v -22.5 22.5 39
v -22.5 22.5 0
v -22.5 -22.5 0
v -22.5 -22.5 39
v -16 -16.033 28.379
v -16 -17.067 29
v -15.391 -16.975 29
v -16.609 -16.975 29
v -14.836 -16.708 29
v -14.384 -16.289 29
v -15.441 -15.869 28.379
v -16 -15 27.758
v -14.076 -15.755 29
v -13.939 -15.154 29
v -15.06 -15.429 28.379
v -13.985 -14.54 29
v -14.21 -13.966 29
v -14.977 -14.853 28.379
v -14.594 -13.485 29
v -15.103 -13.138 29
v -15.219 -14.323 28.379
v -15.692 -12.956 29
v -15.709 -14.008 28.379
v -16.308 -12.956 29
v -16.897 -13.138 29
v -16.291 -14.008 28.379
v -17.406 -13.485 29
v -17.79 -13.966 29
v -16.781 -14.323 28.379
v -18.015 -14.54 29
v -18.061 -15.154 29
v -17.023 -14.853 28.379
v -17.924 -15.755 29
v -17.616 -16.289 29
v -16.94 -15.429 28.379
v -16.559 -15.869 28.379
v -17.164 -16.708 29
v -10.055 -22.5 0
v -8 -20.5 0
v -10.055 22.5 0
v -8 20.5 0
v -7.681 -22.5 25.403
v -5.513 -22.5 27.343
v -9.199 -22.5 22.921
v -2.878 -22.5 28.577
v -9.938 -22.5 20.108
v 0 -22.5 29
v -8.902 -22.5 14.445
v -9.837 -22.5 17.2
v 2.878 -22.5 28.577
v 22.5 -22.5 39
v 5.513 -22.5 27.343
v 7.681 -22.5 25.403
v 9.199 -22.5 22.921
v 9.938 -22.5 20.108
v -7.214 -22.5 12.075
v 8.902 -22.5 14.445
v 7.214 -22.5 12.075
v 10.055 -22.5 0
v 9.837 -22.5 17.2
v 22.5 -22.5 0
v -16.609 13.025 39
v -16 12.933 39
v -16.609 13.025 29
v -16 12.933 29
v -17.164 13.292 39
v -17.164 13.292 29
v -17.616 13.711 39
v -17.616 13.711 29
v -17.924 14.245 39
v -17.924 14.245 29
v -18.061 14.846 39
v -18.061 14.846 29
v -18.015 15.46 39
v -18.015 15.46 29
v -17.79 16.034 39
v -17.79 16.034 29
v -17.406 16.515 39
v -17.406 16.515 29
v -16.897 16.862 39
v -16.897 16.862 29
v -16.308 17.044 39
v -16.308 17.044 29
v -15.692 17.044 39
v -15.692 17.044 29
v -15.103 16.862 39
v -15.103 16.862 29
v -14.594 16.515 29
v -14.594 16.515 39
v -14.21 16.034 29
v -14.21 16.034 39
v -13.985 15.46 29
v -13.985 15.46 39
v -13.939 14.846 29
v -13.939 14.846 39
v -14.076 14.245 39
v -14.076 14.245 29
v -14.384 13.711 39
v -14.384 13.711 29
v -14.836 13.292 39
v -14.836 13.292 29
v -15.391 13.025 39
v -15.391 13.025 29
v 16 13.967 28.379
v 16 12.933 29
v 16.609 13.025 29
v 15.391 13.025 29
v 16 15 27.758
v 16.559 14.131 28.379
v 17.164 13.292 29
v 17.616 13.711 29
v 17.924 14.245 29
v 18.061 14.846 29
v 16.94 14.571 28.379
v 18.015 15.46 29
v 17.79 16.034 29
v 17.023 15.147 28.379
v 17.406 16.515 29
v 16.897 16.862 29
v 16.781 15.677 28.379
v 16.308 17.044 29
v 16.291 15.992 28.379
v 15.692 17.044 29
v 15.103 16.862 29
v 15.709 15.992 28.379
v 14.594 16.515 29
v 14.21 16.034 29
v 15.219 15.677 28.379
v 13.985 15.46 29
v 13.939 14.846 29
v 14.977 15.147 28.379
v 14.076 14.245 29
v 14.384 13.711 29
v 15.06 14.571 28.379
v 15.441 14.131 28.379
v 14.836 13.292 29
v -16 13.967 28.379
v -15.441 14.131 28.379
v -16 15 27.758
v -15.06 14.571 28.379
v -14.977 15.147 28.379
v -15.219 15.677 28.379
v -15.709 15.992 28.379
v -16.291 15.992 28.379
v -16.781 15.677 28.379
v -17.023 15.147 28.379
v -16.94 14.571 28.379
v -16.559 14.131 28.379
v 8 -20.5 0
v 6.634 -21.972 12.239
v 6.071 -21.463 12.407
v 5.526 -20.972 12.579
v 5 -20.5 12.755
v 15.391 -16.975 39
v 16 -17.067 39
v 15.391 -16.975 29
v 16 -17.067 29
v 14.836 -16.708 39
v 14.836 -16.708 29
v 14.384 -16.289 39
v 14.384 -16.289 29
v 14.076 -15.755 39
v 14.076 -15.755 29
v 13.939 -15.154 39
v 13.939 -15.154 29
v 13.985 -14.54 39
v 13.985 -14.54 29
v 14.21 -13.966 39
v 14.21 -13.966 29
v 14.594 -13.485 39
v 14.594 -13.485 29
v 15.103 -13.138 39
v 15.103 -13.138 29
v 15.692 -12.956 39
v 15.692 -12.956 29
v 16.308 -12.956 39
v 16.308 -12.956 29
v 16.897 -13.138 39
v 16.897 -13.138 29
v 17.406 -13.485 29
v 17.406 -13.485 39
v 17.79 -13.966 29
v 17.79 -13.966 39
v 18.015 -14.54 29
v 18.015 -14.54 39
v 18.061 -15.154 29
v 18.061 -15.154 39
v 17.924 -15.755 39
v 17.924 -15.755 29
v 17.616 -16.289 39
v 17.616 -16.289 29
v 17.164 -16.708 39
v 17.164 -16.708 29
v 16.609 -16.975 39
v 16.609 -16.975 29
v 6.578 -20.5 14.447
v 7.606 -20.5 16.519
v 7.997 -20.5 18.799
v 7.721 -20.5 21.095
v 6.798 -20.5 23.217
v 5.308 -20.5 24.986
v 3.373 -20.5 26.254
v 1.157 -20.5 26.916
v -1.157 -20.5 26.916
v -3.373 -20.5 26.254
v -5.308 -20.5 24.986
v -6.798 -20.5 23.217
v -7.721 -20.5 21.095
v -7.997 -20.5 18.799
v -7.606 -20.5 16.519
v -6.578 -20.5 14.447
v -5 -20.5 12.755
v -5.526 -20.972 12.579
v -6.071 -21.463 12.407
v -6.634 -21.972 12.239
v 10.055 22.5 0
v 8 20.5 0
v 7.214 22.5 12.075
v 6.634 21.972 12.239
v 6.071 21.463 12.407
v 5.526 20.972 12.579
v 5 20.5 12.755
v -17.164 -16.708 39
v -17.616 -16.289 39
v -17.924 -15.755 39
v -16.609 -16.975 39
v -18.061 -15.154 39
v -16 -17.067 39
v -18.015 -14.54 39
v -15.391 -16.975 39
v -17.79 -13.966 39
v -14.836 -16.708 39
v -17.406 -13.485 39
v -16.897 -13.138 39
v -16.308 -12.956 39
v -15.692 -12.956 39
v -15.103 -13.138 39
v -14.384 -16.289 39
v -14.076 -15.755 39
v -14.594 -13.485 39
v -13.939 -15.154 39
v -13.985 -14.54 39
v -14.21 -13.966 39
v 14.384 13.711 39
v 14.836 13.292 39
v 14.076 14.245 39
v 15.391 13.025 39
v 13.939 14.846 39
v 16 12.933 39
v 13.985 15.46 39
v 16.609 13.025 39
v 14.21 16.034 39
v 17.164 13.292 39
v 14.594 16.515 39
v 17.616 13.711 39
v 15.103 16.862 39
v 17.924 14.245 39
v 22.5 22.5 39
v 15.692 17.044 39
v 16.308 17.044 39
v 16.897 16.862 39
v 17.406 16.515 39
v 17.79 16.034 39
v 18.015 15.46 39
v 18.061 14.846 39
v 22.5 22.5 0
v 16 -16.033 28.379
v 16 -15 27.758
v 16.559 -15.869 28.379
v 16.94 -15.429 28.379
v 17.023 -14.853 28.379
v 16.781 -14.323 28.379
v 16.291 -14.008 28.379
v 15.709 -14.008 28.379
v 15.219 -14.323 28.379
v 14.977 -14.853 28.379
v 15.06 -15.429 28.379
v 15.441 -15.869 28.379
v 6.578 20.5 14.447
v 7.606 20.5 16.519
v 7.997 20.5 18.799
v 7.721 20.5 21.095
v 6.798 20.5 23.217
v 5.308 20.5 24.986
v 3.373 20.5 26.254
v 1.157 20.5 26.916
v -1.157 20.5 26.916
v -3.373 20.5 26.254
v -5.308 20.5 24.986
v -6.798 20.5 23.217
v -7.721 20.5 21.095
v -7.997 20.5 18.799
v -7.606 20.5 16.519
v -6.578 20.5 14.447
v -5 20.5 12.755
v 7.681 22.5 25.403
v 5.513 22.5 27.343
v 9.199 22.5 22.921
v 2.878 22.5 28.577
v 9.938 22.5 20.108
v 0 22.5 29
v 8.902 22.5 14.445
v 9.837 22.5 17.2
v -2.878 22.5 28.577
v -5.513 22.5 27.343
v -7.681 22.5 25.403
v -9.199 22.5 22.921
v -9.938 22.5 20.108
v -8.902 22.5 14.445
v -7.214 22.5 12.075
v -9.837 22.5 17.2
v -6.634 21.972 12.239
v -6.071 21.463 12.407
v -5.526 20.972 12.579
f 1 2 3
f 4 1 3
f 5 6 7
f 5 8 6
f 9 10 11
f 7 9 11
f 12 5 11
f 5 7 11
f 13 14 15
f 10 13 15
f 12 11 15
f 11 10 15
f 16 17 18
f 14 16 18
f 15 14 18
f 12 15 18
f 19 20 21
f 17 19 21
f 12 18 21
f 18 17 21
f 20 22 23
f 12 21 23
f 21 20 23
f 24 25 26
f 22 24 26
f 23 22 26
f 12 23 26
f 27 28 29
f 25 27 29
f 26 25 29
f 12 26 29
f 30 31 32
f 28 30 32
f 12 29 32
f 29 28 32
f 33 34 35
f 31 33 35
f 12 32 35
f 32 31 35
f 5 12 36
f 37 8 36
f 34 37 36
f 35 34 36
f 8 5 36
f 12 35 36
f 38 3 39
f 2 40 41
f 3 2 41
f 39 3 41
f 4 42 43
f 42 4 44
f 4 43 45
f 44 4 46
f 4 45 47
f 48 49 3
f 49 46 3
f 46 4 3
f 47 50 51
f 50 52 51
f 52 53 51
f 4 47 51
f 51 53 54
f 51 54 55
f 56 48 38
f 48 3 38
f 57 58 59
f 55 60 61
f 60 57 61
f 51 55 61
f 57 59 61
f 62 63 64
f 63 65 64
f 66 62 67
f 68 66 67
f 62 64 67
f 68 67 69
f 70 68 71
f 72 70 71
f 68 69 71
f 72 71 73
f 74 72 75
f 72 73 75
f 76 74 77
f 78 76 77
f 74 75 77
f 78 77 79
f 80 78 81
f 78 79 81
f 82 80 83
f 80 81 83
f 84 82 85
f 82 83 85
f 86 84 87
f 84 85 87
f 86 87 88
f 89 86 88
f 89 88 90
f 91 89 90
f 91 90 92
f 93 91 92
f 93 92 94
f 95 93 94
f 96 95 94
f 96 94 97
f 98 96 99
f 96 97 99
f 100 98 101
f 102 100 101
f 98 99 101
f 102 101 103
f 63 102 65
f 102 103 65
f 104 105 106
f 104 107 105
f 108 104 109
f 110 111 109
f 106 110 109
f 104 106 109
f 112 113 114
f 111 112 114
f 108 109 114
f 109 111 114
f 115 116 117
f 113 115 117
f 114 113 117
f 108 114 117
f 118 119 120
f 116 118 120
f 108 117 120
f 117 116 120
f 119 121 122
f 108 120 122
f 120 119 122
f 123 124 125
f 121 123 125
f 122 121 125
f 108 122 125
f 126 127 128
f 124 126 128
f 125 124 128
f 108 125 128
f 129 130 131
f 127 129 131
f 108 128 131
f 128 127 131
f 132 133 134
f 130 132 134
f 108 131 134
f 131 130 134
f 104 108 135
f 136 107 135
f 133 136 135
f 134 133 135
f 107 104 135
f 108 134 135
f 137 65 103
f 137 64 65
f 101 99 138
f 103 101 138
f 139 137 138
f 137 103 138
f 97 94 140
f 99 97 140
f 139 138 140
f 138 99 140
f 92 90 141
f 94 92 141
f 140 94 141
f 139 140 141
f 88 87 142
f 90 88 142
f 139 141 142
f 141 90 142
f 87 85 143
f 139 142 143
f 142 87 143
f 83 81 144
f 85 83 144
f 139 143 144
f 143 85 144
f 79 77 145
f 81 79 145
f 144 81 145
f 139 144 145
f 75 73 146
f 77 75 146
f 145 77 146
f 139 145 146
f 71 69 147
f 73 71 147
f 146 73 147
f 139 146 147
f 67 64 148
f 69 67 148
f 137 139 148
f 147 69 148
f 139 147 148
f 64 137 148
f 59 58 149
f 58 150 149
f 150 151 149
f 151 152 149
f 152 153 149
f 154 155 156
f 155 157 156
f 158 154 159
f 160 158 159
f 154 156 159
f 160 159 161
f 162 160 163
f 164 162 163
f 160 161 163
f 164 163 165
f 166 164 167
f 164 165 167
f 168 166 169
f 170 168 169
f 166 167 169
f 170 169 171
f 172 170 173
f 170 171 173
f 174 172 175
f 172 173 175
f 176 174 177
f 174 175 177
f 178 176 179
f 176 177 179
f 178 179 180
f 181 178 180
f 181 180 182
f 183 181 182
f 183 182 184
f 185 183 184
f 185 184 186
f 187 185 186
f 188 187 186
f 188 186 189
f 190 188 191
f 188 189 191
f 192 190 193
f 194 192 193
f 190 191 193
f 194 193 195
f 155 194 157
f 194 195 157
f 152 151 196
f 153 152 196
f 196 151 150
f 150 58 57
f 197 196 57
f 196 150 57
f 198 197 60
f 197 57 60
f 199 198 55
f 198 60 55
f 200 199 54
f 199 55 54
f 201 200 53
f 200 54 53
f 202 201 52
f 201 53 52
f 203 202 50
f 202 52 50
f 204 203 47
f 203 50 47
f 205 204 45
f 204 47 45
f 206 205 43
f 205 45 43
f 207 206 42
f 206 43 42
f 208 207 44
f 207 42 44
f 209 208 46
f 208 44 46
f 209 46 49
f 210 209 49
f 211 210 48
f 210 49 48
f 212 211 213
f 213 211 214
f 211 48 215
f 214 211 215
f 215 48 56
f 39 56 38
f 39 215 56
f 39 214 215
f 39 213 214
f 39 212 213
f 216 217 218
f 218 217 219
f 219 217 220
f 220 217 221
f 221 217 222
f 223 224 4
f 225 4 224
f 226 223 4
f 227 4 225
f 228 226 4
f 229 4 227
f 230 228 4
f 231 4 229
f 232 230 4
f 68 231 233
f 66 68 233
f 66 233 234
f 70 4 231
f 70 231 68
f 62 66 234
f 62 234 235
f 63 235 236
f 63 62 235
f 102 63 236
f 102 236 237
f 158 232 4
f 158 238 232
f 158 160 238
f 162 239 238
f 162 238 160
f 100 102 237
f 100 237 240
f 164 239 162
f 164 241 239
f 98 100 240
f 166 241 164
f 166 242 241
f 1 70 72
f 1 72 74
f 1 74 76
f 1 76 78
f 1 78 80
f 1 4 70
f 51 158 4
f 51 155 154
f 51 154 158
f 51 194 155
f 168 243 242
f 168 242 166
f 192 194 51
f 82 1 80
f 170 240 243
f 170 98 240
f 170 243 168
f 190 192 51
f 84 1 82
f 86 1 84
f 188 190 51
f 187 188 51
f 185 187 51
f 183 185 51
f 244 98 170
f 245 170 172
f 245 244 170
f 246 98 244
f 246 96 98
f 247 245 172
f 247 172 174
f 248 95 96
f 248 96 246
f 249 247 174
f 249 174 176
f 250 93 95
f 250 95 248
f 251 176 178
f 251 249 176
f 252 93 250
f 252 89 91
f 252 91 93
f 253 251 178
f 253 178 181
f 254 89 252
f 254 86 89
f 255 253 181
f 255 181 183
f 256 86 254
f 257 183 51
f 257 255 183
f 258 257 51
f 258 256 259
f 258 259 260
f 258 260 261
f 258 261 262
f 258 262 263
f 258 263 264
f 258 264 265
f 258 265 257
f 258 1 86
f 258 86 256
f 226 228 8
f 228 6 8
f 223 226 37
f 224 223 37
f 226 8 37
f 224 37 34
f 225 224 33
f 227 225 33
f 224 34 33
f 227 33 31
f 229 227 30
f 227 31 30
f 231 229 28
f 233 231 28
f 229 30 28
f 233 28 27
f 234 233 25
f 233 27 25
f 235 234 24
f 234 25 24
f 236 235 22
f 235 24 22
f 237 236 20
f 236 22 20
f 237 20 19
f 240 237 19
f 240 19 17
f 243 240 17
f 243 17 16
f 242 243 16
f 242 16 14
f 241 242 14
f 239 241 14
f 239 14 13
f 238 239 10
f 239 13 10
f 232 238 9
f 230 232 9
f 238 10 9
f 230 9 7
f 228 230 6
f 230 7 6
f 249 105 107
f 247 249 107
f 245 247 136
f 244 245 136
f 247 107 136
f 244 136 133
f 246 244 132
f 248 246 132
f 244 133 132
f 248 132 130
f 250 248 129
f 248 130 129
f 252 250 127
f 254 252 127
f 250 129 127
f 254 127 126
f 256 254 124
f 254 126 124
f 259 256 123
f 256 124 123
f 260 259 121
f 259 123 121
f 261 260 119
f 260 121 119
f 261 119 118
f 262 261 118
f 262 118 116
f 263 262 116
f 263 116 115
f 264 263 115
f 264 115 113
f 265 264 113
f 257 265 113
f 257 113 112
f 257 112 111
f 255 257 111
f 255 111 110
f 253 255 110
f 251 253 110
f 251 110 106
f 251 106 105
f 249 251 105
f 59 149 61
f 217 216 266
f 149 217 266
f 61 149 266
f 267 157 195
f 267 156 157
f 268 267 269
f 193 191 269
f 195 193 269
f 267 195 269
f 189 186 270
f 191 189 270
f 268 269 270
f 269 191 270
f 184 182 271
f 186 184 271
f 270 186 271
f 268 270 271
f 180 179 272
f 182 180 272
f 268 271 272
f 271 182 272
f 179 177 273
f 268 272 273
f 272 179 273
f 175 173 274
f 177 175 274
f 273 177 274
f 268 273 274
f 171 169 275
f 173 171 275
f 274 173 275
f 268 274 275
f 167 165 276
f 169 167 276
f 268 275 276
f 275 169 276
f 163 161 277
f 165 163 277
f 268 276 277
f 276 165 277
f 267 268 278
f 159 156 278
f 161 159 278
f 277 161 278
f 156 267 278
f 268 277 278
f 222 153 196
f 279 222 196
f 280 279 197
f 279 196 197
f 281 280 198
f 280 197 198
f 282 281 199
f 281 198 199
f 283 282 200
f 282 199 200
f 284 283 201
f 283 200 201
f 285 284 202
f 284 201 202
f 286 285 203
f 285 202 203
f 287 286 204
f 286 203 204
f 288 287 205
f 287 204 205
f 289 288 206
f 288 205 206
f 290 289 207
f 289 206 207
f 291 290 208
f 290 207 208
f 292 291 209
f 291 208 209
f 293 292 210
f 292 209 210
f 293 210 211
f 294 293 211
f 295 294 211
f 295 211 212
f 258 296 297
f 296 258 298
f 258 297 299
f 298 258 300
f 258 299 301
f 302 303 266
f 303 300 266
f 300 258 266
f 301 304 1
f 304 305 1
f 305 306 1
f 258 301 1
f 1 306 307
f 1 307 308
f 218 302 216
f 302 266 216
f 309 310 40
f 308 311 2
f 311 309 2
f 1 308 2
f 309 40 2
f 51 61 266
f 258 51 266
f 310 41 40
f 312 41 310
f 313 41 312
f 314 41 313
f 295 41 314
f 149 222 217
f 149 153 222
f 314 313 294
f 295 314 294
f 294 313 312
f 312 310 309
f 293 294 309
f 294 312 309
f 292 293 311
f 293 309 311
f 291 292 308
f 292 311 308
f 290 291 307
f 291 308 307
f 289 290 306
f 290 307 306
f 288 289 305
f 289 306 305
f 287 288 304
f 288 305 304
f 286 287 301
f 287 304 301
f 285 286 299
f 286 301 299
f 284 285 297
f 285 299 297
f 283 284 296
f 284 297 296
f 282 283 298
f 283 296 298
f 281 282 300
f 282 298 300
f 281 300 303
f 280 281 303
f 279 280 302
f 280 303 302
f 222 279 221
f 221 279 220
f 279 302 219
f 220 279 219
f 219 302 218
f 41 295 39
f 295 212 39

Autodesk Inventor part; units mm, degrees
ref_plane "YZ Plane" through (0, 0, 0) normal (1, 0, 0) x (0, 1, 0)
ref_plane "XZ Plane" through (0, 0, 0) normal (0, 1, 0) x (-1, 0, 0)
ref_plane "XY Plane" through (0, 0, 0) normal (0, 0, 1) x (1, 0, 0)
sketch "Skizze1" plane through (0, 0, 0) normal (0, 0, 1) x (1, 0, 0)
  line L0 (-22.5, -22.5) -> (22.5, -22.5)
  line L1 (22.5, -22.5) -> (22.5, 22.5)
  line L2 (22.5, 22.5) -> (-22.5, 22.5)
  line L3 (-22.5, 22.5) -> (-22.5, -22.5)
  line L4 (-22.5, -22.5) -> (22.5, 22.5) construction
  line L5 (22.5, -22.5) -> (-22.5, 22.5) construction
  point P0 (0, 0)
  dimension "d0" = 45
  dimension "d1" = 45
extrude "Extrusion1" add sketch "Skizze1" along normal blind 39
sketch "Skizze2" plane through (-22.5, -22.5, 0) normal (0, -1, 0) x (1, 0, 0)
  line L0 (0, 0) -> (45, 0) projected
  line L1 (45, 0) -> (45, 39) projected
  line L2 (0, 39) -> (45, 39) projected
  line L3 (0, 0) -> (0, 39) projected
  circle A0 centre (22.5, 19) radius 8
  line L4 (22.5, 0) -> (22.5, 39)
  line L5 (22.5, 19) -> (22.5, -6)
  line L6 (17.5, 12.755) -> (14.5, 0)
  line L7 (27.5, 12.755) -> (30.5, 0)
  dimension "d4" = 16
  dimension "d5" = 25
  dimension "d6" = 45
  dimension "d7" = 10
  dimension "d8" = 16
extrude "Extrusion2" cut sketch "Skizze2" against normal through all contours L6 A0 L4 L0 | L4 A0 L7 L0 | A0 L4 | L4 A0
chamfer "Fase1" distance 2 angle 45 6 edges at (0, -22.5, 27) (-6.5, -22.5, 6.3775) (6.5, -22.5, 6.3775) (0, 22.5, 27) (-6.5, 22.5, 6.3775) (6.5, 22.5, 6.3775)
ref_plane "Arbeitsebene1" through (-22.5, 0, 39) normal (0, 1, 0) x (1, 0, 0)
sketch "Skizze3" plane through (0, 0, 39) normal (0, 0, 1) x (1, 0, 0)
  line L0 (-22.5, -22.5) -> (22.5, -22.5) projected
  line L1 (22.5, -22.5) -> (22.5, 22.5) projected
  line L2 (22.5, 22.5) -> (-22.5, 22.5) projected
  line L3 (-22.5, 22.5) -> (-22.5, -22.5) projected
  line L4 (16, -15) -> (-16, -15) construction
  line L5 (-16, -15) -> (-16, 15) construction
  line L6 (-16, 15) -> (16, 15) construction
  line L7 (16, 15) -> (16, -15) construction
  line L8 (16, -15) -> (-16, 15) construction
  line L9 (-16, -15) -> (16, 15) construction
  point P0 (0, 0)
  dimension "d14" = 32
  dimension "d15" = 30
hole "Bohrung1" at (-16, -15, 39) at (16, -15, 39) at (-16, 15, 39) at (16, 15, 39) direction (0, 0, -1) diameter 4.134 depth 10 tip angle 118 thread size "M5x0.8" class "6H" standard "ANSI Metric M Profile"
properties part number "Linearwagen_20_kurz" material "Aluminium 6061"
